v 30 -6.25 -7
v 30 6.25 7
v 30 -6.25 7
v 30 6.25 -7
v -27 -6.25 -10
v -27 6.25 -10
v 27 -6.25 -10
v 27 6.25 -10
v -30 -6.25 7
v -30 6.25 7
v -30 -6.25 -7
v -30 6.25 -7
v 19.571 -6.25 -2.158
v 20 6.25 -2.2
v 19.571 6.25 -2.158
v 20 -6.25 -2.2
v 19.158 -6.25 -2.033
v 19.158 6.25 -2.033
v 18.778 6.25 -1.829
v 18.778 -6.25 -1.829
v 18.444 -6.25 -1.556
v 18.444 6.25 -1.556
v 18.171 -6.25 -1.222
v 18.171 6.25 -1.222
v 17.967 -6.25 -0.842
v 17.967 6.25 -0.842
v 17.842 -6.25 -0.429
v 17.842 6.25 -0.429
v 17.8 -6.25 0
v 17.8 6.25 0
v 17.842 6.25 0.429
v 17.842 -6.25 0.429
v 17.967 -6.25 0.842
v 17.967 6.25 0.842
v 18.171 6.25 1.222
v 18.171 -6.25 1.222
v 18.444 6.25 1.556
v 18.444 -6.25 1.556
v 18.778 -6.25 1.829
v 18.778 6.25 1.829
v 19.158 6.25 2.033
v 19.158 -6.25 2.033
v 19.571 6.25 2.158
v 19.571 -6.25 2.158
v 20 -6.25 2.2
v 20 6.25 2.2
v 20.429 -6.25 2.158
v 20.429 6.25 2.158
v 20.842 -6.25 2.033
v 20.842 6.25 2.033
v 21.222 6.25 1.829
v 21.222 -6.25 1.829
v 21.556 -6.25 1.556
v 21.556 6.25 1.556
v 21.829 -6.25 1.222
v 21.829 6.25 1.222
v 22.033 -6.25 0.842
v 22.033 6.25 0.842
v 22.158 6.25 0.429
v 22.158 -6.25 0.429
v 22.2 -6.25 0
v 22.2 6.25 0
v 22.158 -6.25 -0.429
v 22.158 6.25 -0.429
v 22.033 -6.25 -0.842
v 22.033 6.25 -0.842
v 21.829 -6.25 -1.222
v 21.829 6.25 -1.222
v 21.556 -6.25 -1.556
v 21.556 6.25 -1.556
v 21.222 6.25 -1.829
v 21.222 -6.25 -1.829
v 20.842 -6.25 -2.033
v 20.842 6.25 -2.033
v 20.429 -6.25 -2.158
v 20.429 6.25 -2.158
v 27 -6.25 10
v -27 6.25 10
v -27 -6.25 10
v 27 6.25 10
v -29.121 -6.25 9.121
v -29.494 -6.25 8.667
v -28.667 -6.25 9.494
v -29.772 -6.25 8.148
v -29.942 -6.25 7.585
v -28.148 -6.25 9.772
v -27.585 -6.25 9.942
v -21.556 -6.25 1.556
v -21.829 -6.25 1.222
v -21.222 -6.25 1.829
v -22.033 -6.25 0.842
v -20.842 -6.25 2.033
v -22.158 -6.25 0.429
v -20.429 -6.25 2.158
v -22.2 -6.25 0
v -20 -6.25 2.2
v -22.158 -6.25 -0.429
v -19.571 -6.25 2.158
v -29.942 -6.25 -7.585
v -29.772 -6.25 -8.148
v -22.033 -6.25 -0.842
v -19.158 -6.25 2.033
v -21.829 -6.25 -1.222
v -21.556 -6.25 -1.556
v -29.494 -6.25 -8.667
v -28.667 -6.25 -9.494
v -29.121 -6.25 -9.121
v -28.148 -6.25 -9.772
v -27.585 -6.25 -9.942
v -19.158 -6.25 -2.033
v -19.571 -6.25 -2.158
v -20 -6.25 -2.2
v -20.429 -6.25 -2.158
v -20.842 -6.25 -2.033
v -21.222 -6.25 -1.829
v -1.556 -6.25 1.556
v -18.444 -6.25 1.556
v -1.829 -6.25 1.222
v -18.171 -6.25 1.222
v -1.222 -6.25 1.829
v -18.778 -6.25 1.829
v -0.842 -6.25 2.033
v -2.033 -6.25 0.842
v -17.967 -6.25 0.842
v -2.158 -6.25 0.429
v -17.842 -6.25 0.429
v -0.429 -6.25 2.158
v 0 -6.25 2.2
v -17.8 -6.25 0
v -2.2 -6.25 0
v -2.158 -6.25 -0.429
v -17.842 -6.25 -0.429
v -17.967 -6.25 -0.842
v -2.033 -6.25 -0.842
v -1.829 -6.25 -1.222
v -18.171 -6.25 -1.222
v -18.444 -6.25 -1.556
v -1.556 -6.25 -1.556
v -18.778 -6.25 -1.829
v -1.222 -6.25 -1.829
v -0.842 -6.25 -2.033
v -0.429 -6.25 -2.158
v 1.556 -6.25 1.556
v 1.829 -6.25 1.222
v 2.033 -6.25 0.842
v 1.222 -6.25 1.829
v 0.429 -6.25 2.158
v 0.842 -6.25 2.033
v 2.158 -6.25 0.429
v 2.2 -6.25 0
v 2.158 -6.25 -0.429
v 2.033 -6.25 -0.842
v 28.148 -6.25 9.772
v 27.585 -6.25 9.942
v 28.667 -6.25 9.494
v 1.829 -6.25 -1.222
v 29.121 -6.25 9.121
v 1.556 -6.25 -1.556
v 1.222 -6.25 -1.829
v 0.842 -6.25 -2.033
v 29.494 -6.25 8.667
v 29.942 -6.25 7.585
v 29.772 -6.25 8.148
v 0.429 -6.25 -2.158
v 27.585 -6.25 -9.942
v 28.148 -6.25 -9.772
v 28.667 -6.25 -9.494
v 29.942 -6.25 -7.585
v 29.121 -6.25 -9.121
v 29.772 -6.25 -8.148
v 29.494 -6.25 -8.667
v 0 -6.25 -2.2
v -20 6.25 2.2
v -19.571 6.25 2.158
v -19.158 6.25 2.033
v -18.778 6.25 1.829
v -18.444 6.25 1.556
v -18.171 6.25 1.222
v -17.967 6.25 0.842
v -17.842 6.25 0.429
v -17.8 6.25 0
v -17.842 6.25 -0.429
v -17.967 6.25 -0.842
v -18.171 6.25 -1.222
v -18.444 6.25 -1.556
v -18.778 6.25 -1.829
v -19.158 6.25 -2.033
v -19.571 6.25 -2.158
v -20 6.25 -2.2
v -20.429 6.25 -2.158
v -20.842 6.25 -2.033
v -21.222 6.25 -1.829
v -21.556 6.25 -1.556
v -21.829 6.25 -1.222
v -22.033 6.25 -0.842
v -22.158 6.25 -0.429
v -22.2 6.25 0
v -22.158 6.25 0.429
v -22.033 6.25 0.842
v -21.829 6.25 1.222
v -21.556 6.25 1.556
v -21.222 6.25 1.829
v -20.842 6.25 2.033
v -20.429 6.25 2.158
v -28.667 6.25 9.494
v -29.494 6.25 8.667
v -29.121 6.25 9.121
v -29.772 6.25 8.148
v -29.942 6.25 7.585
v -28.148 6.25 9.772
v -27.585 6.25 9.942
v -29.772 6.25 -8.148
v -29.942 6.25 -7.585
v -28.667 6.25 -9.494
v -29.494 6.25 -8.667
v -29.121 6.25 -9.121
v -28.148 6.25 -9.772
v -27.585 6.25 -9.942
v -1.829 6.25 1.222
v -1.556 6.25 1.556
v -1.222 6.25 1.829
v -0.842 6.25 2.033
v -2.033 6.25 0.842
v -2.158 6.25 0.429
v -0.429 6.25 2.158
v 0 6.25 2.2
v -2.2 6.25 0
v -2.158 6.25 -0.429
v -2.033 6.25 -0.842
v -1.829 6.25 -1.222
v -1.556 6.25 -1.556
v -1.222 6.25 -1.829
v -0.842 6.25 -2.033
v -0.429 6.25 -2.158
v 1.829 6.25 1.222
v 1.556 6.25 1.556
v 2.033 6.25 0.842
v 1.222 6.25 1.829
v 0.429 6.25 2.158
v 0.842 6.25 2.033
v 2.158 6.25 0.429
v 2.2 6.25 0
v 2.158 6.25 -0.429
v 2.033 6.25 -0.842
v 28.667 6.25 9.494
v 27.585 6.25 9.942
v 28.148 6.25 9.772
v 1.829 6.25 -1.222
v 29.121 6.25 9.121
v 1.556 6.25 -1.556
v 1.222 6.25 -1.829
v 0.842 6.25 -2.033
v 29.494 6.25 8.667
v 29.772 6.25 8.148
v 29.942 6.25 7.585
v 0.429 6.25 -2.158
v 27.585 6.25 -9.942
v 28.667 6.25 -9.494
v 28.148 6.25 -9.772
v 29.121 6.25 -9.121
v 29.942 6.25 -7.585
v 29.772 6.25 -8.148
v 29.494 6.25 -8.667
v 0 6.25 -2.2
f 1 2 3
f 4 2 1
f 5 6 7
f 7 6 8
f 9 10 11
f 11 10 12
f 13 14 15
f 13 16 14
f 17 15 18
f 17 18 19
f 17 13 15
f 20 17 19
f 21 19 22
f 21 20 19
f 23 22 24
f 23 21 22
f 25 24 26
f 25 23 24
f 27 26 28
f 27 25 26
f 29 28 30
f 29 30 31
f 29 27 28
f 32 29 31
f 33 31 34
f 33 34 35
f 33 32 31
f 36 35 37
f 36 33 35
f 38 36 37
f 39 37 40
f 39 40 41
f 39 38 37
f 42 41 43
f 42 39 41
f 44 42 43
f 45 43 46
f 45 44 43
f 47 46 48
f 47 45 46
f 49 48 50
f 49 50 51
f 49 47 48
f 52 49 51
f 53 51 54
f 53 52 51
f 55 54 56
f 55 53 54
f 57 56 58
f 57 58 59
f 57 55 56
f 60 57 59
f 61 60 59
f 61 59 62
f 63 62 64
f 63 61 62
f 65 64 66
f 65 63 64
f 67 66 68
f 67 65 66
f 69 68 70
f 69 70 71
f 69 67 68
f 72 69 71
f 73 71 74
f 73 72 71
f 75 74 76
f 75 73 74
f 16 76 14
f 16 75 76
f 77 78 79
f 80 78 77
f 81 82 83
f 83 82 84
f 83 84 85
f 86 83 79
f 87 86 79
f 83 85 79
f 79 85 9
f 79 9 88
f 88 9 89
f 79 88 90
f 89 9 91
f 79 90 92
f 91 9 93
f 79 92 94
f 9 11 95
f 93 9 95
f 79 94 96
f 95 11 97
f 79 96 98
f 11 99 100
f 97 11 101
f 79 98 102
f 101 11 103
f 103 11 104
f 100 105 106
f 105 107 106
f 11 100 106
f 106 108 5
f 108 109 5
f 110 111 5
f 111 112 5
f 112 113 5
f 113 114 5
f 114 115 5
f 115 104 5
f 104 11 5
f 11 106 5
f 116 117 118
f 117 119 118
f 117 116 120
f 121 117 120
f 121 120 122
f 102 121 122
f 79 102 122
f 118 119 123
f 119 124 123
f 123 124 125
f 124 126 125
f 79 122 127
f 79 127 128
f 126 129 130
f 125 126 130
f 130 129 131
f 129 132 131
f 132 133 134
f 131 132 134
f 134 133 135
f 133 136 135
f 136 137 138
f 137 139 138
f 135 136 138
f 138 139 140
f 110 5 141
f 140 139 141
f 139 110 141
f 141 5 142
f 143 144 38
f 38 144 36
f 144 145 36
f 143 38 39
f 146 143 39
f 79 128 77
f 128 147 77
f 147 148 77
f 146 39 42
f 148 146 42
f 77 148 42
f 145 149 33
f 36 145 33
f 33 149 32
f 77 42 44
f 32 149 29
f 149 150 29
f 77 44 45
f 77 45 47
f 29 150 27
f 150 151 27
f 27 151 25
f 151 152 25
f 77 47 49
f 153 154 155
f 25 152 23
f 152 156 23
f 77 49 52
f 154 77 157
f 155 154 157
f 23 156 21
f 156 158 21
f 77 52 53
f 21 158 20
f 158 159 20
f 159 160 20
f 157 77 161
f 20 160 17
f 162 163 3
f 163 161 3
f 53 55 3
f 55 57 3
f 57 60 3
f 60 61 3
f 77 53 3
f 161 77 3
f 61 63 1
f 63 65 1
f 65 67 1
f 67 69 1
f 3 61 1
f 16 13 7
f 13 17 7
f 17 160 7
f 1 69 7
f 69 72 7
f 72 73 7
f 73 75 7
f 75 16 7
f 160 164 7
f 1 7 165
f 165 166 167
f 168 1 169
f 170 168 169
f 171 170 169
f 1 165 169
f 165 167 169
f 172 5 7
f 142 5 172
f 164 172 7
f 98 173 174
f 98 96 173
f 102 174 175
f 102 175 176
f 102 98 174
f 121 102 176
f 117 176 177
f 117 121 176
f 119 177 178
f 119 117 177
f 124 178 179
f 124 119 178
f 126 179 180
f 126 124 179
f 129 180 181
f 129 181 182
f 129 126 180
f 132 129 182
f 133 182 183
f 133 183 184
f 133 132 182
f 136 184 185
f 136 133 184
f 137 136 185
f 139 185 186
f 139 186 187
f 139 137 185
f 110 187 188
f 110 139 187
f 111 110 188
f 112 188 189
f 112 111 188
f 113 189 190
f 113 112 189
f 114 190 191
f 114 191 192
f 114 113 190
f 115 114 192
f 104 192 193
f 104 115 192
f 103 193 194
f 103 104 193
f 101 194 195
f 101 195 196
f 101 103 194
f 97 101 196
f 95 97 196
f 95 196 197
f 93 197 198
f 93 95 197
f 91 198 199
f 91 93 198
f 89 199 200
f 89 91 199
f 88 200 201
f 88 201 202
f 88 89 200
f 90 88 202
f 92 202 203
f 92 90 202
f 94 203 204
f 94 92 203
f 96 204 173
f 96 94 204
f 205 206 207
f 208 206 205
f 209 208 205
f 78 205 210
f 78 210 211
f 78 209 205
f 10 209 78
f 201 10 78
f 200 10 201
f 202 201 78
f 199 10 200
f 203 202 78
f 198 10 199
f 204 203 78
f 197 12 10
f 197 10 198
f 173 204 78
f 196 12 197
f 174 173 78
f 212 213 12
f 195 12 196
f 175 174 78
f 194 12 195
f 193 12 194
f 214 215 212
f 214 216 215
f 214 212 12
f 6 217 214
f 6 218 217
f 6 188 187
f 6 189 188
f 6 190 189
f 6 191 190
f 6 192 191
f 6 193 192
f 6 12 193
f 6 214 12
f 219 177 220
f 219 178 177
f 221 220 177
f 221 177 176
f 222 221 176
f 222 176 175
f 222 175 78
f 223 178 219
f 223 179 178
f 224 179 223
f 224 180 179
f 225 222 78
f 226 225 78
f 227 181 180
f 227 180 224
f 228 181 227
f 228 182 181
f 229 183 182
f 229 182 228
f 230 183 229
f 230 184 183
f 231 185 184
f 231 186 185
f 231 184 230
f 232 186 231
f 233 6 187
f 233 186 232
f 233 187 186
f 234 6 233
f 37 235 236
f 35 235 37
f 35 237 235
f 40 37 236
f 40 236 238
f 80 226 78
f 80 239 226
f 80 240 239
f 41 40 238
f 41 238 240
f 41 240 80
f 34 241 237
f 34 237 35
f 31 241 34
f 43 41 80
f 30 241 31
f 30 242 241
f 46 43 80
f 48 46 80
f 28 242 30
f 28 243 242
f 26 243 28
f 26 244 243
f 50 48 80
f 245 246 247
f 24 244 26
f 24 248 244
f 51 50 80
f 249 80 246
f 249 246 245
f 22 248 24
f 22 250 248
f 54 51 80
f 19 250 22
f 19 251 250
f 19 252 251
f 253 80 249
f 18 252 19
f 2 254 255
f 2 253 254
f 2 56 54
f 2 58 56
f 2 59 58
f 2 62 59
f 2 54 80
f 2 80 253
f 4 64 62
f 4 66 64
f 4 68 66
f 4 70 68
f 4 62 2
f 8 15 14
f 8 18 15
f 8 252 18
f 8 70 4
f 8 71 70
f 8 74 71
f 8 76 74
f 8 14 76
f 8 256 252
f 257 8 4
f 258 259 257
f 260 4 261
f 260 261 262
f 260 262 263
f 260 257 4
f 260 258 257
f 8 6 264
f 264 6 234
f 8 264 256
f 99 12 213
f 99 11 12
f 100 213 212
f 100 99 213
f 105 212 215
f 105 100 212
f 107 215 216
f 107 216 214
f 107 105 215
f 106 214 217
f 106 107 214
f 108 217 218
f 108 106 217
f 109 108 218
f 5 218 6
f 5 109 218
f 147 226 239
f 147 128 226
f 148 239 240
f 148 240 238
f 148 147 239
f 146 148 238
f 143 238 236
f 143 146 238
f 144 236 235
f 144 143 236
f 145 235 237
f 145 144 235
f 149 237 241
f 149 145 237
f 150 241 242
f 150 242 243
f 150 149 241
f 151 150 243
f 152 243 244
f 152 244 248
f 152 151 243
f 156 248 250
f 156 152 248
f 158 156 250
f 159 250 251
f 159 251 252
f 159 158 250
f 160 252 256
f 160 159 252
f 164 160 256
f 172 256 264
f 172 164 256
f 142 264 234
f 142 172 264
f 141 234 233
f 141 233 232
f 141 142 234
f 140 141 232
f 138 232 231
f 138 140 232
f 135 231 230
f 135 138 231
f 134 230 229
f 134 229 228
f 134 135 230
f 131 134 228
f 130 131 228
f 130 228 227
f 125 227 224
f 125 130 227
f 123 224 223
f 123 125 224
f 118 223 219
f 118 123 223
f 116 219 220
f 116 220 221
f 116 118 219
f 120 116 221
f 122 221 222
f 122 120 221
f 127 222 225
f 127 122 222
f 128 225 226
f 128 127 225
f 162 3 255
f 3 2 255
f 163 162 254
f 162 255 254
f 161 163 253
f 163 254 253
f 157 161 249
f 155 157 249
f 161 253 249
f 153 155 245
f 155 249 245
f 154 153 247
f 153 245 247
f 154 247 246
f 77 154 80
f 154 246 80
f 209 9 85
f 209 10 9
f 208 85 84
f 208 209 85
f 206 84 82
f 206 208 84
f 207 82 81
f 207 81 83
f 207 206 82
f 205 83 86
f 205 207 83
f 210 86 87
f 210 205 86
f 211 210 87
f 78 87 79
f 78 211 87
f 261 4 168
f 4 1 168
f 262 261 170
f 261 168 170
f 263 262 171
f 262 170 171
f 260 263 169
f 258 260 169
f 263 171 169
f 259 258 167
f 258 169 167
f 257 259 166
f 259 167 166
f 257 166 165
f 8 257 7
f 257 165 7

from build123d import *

# Parameters (mm, degrees)
SKETCH_1_W      = 60
SKETCH_1_H      = 20
SKETCH_1_R      = 2.2
EXTRUDE_1_DEPTH = 6.25
FILLET_1_R      = 3


with BuildPart() as part:
    # 草图1 → 凸台-拉伸1 (new, symmetric)
    with BuildSketch(Plane(origin=(0, 0, 0), x_dir=(1, 0, 0), z_dir=(0, 1, 0))):
        Rectangle(SKETCH_1_W, SKETCH_1_H)
        with Locations(Location((0, 0, 0), (0, 0, 270))):
            Circle(SKETCH_1_R, mode=Mode.SUBTRACT)
        with Locations(Location((-20, 0, 0), (0, 0, 270))):
            Circle(SKETCH_1_R, mode=Mode.SUBTRACT)
        with Locations(Location((20, 0, 0), (0, 0, 90))):
            Circle(SKETCH_1_R, mode=Mode.SUBTRACT)
    extrude(amount=EXTRUDE_1_DEPTH, both=True)

    # 圆角1
    fillet_1_edges = [part.edges().sort_by_distance(p)[0] for p in [
        (30, 0, 10),
        (-30, 0, 10),
        (-30, 0, -10),
        (30, 0, -10),
    ]]
    fillet(fillet_1_edges, radius=FILLET_1_R)


solid = part.part
